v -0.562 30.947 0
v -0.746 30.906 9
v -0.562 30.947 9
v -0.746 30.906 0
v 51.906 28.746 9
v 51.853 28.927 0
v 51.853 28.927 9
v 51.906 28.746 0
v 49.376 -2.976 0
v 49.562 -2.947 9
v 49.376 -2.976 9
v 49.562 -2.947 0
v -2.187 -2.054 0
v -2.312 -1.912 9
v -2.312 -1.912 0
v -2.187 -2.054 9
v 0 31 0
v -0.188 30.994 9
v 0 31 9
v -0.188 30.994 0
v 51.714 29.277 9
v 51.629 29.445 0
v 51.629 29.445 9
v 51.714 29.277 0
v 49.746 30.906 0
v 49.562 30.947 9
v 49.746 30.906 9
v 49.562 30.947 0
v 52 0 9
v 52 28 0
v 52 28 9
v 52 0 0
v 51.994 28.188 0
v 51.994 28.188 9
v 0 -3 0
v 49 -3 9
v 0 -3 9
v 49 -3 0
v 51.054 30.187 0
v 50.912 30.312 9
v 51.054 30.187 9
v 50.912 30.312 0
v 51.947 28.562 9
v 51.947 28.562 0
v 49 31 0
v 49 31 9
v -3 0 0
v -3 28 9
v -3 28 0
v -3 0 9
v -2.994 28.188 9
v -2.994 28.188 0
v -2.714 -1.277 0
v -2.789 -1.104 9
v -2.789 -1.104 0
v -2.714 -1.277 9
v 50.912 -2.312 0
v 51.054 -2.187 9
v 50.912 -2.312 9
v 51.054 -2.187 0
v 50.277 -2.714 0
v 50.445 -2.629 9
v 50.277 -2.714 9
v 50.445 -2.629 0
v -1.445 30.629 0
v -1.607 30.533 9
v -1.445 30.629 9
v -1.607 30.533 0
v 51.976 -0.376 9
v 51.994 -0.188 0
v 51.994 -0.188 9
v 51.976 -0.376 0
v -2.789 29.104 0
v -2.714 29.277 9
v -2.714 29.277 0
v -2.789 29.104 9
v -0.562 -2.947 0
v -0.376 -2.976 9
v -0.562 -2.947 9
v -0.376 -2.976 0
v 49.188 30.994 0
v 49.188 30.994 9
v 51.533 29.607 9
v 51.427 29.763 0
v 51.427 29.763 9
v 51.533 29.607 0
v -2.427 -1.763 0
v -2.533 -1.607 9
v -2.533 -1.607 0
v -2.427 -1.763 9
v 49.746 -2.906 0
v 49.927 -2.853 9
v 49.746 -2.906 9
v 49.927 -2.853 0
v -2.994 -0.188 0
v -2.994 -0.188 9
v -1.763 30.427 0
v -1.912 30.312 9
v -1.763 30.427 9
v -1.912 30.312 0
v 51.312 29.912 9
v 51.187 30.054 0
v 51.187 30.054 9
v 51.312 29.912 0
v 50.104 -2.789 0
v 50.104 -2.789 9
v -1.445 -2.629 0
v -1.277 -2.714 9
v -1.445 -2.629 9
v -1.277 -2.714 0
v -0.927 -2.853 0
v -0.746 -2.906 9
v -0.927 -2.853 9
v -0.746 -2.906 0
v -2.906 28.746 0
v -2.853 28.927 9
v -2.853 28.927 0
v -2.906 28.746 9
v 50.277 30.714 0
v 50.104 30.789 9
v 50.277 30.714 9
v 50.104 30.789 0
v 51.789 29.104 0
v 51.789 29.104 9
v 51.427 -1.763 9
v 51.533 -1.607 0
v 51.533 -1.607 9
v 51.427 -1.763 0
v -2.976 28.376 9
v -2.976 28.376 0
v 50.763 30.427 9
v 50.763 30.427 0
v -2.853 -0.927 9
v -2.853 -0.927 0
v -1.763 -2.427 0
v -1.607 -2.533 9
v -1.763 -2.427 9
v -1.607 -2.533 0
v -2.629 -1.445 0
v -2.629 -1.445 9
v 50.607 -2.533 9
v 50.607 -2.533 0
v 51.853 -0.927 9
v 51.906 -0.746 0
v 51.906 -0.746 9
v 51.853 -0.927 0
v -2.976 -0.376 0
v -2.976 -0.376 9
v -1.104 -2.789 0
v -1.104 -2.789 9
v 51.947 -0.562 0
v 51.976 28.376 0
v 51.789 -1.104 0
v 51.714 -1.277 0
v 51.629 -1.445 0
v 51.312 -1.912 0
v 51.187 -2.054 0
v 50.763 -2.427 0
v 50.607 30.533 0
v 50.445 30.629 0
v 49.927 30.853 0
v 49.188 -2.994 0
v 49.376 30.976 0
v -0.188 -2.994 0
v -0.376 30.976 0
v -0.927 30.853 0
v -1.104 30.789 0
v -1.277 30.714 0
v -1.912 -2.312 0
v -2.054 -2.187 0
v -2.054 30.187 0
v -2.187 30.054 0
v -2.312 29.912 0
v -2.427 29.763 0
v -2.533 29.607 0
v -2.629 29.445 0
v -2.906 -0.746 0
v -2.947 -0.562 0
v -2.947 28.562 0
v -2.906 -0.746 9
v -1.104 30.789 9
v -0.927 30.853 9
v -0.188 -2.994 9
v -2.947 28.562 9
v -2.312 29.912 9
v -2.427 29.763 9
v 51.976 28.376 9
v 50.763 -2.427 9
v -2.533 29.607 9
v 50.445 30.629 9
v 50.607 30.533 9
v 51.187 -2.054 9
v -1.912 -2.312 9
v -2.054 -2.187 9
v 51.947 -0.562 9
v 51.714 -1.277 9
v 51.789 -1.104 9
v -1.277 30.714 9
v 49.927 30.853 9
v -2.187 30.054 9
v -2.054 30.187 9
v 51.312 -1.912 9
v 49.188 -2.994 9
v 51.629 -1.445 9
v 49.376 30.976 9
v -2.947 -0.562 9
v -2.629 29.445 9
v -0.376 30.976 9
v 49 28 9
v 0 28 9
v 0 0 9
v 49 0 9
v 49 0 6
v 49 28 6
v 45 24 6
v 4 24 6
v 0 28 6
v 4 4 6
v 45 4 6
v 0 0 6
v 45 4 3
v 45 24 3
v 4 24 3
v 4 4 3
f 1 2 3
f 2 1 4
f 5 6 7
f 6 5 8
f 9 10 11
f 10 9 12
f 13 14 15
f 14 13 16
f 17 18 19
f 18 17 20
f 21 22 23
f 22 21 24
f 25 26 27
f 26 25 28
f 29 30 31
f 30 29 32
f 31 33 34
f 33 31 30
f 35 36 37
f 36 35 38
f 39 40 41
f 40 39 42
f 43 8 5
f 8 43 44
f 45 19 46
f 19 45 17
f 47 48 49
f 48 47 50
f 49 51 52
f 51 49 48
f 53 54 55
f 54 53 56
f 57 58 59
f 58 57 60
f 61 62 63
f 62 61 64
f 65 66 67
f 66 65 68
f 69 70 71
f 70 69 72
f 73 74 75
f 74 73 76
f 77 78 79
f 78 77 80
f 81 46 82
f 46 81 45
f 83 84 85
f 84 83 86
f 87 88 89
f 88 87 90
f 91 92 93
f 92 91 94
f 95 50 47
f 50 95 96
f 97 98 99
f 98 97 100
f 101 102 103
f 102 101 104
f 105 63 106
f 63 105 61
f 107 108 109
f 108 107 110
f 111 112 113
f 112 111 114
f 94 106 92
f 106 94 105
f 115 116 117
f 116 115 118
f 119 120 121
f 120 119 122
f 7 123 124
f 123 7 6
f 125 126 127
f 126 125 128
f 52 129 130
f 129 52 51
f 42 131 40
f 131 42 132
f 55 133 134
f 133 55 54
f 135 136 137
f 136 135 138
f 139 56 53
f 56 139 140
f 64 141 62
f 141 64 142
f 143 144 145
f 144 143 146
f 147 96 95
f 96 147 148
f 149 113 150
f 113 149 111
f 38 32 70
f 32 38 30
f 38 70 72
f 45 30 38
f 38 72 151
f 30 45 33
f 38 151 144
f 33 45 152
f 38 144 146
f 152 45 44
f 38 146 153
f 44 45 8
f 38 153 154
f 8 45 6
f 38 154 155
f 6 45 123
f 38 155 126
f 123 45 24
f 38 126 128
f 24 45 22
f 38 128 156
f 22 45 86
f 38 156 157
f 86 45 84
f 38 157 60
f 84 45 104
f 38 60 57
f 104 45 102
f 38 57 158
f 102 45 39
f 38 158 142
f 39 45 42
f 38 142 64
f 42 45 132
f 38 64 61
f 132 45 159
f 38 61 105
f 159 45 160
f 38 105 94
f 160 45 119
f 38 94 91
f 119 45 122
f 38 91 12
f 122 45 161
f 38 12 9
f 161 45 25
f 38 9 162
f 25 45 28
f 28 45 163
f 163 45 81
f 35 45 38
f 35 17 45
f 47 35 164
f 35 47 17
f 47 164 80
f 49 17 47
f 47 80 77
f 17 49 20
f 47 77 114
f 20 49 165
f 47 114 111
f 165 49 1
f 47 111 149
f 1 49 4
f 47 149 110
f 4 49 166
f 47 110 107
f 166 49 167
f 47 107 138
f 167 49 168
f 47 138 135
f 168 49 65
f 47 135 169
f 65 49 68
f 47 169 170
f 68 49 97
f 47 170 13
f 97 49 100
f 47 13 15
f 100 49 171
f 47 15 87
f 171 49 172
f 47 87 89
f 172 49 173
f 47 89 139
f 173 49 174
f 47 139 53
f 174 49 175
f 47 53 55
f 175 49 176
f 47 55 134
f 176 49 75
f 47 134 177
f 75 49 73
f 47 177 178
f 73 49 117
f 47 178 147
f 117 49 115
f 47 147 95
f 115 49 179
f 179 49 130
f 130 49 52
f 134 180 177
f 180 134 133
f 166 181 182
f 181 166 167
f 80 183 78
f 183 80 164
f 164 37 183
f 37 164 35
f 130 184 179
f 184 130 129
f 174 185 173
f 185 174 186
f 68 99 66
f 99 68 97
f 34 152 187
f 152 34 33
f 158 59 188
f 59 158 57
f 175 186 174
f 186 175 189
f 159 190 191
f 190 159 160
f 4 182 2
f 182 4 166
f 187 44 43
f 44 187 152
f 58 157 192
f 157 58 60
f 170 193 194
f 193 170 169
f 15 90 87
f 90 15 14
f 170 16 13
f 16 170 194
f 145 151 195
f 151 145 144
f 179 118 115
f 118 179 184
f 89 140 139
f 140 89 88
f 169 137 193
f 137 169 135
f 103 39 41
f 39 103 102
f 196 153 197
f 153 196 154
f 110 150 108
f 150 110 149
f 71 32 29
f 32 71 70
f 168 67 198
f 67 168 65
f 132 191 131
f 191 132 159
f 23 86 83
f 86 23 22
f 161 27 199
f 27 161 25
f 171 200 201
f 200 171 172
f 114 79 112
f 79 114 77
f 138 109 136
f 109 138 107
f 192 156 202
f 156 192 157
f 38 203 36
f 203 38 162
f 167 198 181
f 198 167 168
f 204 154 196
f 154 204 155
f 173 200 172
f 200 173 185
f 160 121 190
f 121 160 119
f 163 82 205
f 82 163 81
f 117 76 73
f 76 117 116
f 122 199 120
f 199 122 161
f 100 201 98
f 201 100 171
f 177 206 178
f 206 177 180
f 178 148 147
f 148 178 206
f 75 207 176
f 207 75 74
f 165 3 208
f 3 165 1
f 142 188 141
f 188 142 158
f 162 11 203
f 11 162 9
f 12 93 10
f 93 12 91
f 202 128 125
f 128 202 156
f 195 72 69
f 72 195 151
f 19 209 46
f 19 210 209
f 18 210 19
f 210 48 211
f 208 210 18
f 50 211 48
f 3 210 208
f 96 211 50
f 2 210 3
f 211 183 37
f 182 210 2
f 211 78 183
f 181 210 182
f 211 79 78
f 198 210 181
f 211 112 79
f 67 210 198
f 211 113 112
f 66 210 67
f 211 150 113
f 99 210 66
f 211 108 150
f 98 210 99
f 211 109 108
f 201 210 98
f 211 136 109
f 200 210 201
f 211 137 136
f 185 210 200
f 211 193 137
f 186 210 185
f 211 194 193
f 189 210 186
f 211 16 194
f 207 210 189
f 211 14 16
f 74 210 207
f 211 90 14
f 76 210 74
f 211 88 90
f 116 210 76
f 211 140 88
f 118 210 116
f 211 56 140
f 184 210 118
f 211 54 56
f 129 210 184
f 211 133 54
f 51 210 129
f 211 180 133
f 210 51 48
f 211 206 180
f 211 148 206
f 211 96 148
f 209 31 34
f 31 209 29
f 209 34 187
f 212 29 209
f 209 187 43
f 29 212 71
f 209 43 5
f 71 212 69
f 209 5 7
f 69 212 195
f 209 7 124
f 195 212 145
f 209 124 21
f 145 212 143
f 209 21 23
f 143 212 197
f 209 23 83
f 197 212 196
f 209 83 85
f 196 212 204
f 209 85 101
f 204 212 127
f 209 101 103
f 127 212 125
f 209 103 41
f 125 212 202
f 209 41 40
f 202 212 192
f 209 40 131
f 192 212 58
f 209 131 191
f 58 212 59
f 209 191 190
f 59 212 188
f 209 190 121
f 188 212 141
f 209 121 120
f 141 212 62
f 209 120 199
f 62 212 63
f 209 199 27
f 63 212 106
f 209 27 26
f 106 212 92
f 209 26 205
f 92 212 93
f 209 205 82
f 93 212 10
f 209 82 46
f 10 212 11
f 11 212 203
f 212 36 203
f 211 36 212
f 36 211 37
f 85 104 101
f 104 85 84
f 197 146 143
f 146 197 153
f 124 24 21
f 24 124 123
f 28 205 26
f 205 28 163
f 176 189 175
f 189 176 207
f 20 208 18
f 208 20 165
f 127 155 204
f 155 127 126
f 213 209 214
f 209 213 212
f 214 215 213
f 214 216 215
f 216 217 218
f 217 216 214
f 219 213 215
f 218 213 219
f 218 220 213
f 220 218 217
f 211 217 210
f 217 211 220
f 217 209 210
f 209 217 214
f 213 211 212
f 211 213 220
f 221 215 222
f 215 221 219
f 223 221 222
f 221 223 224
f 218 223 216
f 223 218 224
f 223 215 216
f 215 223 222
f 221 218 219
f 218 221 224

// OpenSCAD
$fn=100;

boardWith = 49; // PC Board Width
boardLength = 28; // PC Board Length

wallThickness = 3; // Wall thickness of the base
baseHigh = 8; // The Base Hight

ThT = true; // Through Hole Tracks; False for Serface Mount Components

difference(){
    Base(boardWith,boardLength,baseHigh, wallThickness, 2);
    if (ThT == true){
        TrackCounterSink(w=boardWith,
            l=boardLength,
            h=baseHigh, 
            depth=5, 
            relief=4);
    }
}


module SideClip(w,l,h){
    
}

module TrackCounterSink(w,l,h,depth, relief){
    
    sinkWidth = w-(2*relief);
    sinklength = l-(2*relief);
    echo(h-depth);
    translate([relief,relief,h-depth])
        cube([sinkWidth,sinklength,h+2]);
}

module Base(w,l,h,t,depth){
    difference(){
        
        minkowski(){
            cube([w,l,h]);
            cylinder(r=t,h=1);
        }

        translate([0,0,h-depth])
            cube([w,l,h]);        
    }
}
